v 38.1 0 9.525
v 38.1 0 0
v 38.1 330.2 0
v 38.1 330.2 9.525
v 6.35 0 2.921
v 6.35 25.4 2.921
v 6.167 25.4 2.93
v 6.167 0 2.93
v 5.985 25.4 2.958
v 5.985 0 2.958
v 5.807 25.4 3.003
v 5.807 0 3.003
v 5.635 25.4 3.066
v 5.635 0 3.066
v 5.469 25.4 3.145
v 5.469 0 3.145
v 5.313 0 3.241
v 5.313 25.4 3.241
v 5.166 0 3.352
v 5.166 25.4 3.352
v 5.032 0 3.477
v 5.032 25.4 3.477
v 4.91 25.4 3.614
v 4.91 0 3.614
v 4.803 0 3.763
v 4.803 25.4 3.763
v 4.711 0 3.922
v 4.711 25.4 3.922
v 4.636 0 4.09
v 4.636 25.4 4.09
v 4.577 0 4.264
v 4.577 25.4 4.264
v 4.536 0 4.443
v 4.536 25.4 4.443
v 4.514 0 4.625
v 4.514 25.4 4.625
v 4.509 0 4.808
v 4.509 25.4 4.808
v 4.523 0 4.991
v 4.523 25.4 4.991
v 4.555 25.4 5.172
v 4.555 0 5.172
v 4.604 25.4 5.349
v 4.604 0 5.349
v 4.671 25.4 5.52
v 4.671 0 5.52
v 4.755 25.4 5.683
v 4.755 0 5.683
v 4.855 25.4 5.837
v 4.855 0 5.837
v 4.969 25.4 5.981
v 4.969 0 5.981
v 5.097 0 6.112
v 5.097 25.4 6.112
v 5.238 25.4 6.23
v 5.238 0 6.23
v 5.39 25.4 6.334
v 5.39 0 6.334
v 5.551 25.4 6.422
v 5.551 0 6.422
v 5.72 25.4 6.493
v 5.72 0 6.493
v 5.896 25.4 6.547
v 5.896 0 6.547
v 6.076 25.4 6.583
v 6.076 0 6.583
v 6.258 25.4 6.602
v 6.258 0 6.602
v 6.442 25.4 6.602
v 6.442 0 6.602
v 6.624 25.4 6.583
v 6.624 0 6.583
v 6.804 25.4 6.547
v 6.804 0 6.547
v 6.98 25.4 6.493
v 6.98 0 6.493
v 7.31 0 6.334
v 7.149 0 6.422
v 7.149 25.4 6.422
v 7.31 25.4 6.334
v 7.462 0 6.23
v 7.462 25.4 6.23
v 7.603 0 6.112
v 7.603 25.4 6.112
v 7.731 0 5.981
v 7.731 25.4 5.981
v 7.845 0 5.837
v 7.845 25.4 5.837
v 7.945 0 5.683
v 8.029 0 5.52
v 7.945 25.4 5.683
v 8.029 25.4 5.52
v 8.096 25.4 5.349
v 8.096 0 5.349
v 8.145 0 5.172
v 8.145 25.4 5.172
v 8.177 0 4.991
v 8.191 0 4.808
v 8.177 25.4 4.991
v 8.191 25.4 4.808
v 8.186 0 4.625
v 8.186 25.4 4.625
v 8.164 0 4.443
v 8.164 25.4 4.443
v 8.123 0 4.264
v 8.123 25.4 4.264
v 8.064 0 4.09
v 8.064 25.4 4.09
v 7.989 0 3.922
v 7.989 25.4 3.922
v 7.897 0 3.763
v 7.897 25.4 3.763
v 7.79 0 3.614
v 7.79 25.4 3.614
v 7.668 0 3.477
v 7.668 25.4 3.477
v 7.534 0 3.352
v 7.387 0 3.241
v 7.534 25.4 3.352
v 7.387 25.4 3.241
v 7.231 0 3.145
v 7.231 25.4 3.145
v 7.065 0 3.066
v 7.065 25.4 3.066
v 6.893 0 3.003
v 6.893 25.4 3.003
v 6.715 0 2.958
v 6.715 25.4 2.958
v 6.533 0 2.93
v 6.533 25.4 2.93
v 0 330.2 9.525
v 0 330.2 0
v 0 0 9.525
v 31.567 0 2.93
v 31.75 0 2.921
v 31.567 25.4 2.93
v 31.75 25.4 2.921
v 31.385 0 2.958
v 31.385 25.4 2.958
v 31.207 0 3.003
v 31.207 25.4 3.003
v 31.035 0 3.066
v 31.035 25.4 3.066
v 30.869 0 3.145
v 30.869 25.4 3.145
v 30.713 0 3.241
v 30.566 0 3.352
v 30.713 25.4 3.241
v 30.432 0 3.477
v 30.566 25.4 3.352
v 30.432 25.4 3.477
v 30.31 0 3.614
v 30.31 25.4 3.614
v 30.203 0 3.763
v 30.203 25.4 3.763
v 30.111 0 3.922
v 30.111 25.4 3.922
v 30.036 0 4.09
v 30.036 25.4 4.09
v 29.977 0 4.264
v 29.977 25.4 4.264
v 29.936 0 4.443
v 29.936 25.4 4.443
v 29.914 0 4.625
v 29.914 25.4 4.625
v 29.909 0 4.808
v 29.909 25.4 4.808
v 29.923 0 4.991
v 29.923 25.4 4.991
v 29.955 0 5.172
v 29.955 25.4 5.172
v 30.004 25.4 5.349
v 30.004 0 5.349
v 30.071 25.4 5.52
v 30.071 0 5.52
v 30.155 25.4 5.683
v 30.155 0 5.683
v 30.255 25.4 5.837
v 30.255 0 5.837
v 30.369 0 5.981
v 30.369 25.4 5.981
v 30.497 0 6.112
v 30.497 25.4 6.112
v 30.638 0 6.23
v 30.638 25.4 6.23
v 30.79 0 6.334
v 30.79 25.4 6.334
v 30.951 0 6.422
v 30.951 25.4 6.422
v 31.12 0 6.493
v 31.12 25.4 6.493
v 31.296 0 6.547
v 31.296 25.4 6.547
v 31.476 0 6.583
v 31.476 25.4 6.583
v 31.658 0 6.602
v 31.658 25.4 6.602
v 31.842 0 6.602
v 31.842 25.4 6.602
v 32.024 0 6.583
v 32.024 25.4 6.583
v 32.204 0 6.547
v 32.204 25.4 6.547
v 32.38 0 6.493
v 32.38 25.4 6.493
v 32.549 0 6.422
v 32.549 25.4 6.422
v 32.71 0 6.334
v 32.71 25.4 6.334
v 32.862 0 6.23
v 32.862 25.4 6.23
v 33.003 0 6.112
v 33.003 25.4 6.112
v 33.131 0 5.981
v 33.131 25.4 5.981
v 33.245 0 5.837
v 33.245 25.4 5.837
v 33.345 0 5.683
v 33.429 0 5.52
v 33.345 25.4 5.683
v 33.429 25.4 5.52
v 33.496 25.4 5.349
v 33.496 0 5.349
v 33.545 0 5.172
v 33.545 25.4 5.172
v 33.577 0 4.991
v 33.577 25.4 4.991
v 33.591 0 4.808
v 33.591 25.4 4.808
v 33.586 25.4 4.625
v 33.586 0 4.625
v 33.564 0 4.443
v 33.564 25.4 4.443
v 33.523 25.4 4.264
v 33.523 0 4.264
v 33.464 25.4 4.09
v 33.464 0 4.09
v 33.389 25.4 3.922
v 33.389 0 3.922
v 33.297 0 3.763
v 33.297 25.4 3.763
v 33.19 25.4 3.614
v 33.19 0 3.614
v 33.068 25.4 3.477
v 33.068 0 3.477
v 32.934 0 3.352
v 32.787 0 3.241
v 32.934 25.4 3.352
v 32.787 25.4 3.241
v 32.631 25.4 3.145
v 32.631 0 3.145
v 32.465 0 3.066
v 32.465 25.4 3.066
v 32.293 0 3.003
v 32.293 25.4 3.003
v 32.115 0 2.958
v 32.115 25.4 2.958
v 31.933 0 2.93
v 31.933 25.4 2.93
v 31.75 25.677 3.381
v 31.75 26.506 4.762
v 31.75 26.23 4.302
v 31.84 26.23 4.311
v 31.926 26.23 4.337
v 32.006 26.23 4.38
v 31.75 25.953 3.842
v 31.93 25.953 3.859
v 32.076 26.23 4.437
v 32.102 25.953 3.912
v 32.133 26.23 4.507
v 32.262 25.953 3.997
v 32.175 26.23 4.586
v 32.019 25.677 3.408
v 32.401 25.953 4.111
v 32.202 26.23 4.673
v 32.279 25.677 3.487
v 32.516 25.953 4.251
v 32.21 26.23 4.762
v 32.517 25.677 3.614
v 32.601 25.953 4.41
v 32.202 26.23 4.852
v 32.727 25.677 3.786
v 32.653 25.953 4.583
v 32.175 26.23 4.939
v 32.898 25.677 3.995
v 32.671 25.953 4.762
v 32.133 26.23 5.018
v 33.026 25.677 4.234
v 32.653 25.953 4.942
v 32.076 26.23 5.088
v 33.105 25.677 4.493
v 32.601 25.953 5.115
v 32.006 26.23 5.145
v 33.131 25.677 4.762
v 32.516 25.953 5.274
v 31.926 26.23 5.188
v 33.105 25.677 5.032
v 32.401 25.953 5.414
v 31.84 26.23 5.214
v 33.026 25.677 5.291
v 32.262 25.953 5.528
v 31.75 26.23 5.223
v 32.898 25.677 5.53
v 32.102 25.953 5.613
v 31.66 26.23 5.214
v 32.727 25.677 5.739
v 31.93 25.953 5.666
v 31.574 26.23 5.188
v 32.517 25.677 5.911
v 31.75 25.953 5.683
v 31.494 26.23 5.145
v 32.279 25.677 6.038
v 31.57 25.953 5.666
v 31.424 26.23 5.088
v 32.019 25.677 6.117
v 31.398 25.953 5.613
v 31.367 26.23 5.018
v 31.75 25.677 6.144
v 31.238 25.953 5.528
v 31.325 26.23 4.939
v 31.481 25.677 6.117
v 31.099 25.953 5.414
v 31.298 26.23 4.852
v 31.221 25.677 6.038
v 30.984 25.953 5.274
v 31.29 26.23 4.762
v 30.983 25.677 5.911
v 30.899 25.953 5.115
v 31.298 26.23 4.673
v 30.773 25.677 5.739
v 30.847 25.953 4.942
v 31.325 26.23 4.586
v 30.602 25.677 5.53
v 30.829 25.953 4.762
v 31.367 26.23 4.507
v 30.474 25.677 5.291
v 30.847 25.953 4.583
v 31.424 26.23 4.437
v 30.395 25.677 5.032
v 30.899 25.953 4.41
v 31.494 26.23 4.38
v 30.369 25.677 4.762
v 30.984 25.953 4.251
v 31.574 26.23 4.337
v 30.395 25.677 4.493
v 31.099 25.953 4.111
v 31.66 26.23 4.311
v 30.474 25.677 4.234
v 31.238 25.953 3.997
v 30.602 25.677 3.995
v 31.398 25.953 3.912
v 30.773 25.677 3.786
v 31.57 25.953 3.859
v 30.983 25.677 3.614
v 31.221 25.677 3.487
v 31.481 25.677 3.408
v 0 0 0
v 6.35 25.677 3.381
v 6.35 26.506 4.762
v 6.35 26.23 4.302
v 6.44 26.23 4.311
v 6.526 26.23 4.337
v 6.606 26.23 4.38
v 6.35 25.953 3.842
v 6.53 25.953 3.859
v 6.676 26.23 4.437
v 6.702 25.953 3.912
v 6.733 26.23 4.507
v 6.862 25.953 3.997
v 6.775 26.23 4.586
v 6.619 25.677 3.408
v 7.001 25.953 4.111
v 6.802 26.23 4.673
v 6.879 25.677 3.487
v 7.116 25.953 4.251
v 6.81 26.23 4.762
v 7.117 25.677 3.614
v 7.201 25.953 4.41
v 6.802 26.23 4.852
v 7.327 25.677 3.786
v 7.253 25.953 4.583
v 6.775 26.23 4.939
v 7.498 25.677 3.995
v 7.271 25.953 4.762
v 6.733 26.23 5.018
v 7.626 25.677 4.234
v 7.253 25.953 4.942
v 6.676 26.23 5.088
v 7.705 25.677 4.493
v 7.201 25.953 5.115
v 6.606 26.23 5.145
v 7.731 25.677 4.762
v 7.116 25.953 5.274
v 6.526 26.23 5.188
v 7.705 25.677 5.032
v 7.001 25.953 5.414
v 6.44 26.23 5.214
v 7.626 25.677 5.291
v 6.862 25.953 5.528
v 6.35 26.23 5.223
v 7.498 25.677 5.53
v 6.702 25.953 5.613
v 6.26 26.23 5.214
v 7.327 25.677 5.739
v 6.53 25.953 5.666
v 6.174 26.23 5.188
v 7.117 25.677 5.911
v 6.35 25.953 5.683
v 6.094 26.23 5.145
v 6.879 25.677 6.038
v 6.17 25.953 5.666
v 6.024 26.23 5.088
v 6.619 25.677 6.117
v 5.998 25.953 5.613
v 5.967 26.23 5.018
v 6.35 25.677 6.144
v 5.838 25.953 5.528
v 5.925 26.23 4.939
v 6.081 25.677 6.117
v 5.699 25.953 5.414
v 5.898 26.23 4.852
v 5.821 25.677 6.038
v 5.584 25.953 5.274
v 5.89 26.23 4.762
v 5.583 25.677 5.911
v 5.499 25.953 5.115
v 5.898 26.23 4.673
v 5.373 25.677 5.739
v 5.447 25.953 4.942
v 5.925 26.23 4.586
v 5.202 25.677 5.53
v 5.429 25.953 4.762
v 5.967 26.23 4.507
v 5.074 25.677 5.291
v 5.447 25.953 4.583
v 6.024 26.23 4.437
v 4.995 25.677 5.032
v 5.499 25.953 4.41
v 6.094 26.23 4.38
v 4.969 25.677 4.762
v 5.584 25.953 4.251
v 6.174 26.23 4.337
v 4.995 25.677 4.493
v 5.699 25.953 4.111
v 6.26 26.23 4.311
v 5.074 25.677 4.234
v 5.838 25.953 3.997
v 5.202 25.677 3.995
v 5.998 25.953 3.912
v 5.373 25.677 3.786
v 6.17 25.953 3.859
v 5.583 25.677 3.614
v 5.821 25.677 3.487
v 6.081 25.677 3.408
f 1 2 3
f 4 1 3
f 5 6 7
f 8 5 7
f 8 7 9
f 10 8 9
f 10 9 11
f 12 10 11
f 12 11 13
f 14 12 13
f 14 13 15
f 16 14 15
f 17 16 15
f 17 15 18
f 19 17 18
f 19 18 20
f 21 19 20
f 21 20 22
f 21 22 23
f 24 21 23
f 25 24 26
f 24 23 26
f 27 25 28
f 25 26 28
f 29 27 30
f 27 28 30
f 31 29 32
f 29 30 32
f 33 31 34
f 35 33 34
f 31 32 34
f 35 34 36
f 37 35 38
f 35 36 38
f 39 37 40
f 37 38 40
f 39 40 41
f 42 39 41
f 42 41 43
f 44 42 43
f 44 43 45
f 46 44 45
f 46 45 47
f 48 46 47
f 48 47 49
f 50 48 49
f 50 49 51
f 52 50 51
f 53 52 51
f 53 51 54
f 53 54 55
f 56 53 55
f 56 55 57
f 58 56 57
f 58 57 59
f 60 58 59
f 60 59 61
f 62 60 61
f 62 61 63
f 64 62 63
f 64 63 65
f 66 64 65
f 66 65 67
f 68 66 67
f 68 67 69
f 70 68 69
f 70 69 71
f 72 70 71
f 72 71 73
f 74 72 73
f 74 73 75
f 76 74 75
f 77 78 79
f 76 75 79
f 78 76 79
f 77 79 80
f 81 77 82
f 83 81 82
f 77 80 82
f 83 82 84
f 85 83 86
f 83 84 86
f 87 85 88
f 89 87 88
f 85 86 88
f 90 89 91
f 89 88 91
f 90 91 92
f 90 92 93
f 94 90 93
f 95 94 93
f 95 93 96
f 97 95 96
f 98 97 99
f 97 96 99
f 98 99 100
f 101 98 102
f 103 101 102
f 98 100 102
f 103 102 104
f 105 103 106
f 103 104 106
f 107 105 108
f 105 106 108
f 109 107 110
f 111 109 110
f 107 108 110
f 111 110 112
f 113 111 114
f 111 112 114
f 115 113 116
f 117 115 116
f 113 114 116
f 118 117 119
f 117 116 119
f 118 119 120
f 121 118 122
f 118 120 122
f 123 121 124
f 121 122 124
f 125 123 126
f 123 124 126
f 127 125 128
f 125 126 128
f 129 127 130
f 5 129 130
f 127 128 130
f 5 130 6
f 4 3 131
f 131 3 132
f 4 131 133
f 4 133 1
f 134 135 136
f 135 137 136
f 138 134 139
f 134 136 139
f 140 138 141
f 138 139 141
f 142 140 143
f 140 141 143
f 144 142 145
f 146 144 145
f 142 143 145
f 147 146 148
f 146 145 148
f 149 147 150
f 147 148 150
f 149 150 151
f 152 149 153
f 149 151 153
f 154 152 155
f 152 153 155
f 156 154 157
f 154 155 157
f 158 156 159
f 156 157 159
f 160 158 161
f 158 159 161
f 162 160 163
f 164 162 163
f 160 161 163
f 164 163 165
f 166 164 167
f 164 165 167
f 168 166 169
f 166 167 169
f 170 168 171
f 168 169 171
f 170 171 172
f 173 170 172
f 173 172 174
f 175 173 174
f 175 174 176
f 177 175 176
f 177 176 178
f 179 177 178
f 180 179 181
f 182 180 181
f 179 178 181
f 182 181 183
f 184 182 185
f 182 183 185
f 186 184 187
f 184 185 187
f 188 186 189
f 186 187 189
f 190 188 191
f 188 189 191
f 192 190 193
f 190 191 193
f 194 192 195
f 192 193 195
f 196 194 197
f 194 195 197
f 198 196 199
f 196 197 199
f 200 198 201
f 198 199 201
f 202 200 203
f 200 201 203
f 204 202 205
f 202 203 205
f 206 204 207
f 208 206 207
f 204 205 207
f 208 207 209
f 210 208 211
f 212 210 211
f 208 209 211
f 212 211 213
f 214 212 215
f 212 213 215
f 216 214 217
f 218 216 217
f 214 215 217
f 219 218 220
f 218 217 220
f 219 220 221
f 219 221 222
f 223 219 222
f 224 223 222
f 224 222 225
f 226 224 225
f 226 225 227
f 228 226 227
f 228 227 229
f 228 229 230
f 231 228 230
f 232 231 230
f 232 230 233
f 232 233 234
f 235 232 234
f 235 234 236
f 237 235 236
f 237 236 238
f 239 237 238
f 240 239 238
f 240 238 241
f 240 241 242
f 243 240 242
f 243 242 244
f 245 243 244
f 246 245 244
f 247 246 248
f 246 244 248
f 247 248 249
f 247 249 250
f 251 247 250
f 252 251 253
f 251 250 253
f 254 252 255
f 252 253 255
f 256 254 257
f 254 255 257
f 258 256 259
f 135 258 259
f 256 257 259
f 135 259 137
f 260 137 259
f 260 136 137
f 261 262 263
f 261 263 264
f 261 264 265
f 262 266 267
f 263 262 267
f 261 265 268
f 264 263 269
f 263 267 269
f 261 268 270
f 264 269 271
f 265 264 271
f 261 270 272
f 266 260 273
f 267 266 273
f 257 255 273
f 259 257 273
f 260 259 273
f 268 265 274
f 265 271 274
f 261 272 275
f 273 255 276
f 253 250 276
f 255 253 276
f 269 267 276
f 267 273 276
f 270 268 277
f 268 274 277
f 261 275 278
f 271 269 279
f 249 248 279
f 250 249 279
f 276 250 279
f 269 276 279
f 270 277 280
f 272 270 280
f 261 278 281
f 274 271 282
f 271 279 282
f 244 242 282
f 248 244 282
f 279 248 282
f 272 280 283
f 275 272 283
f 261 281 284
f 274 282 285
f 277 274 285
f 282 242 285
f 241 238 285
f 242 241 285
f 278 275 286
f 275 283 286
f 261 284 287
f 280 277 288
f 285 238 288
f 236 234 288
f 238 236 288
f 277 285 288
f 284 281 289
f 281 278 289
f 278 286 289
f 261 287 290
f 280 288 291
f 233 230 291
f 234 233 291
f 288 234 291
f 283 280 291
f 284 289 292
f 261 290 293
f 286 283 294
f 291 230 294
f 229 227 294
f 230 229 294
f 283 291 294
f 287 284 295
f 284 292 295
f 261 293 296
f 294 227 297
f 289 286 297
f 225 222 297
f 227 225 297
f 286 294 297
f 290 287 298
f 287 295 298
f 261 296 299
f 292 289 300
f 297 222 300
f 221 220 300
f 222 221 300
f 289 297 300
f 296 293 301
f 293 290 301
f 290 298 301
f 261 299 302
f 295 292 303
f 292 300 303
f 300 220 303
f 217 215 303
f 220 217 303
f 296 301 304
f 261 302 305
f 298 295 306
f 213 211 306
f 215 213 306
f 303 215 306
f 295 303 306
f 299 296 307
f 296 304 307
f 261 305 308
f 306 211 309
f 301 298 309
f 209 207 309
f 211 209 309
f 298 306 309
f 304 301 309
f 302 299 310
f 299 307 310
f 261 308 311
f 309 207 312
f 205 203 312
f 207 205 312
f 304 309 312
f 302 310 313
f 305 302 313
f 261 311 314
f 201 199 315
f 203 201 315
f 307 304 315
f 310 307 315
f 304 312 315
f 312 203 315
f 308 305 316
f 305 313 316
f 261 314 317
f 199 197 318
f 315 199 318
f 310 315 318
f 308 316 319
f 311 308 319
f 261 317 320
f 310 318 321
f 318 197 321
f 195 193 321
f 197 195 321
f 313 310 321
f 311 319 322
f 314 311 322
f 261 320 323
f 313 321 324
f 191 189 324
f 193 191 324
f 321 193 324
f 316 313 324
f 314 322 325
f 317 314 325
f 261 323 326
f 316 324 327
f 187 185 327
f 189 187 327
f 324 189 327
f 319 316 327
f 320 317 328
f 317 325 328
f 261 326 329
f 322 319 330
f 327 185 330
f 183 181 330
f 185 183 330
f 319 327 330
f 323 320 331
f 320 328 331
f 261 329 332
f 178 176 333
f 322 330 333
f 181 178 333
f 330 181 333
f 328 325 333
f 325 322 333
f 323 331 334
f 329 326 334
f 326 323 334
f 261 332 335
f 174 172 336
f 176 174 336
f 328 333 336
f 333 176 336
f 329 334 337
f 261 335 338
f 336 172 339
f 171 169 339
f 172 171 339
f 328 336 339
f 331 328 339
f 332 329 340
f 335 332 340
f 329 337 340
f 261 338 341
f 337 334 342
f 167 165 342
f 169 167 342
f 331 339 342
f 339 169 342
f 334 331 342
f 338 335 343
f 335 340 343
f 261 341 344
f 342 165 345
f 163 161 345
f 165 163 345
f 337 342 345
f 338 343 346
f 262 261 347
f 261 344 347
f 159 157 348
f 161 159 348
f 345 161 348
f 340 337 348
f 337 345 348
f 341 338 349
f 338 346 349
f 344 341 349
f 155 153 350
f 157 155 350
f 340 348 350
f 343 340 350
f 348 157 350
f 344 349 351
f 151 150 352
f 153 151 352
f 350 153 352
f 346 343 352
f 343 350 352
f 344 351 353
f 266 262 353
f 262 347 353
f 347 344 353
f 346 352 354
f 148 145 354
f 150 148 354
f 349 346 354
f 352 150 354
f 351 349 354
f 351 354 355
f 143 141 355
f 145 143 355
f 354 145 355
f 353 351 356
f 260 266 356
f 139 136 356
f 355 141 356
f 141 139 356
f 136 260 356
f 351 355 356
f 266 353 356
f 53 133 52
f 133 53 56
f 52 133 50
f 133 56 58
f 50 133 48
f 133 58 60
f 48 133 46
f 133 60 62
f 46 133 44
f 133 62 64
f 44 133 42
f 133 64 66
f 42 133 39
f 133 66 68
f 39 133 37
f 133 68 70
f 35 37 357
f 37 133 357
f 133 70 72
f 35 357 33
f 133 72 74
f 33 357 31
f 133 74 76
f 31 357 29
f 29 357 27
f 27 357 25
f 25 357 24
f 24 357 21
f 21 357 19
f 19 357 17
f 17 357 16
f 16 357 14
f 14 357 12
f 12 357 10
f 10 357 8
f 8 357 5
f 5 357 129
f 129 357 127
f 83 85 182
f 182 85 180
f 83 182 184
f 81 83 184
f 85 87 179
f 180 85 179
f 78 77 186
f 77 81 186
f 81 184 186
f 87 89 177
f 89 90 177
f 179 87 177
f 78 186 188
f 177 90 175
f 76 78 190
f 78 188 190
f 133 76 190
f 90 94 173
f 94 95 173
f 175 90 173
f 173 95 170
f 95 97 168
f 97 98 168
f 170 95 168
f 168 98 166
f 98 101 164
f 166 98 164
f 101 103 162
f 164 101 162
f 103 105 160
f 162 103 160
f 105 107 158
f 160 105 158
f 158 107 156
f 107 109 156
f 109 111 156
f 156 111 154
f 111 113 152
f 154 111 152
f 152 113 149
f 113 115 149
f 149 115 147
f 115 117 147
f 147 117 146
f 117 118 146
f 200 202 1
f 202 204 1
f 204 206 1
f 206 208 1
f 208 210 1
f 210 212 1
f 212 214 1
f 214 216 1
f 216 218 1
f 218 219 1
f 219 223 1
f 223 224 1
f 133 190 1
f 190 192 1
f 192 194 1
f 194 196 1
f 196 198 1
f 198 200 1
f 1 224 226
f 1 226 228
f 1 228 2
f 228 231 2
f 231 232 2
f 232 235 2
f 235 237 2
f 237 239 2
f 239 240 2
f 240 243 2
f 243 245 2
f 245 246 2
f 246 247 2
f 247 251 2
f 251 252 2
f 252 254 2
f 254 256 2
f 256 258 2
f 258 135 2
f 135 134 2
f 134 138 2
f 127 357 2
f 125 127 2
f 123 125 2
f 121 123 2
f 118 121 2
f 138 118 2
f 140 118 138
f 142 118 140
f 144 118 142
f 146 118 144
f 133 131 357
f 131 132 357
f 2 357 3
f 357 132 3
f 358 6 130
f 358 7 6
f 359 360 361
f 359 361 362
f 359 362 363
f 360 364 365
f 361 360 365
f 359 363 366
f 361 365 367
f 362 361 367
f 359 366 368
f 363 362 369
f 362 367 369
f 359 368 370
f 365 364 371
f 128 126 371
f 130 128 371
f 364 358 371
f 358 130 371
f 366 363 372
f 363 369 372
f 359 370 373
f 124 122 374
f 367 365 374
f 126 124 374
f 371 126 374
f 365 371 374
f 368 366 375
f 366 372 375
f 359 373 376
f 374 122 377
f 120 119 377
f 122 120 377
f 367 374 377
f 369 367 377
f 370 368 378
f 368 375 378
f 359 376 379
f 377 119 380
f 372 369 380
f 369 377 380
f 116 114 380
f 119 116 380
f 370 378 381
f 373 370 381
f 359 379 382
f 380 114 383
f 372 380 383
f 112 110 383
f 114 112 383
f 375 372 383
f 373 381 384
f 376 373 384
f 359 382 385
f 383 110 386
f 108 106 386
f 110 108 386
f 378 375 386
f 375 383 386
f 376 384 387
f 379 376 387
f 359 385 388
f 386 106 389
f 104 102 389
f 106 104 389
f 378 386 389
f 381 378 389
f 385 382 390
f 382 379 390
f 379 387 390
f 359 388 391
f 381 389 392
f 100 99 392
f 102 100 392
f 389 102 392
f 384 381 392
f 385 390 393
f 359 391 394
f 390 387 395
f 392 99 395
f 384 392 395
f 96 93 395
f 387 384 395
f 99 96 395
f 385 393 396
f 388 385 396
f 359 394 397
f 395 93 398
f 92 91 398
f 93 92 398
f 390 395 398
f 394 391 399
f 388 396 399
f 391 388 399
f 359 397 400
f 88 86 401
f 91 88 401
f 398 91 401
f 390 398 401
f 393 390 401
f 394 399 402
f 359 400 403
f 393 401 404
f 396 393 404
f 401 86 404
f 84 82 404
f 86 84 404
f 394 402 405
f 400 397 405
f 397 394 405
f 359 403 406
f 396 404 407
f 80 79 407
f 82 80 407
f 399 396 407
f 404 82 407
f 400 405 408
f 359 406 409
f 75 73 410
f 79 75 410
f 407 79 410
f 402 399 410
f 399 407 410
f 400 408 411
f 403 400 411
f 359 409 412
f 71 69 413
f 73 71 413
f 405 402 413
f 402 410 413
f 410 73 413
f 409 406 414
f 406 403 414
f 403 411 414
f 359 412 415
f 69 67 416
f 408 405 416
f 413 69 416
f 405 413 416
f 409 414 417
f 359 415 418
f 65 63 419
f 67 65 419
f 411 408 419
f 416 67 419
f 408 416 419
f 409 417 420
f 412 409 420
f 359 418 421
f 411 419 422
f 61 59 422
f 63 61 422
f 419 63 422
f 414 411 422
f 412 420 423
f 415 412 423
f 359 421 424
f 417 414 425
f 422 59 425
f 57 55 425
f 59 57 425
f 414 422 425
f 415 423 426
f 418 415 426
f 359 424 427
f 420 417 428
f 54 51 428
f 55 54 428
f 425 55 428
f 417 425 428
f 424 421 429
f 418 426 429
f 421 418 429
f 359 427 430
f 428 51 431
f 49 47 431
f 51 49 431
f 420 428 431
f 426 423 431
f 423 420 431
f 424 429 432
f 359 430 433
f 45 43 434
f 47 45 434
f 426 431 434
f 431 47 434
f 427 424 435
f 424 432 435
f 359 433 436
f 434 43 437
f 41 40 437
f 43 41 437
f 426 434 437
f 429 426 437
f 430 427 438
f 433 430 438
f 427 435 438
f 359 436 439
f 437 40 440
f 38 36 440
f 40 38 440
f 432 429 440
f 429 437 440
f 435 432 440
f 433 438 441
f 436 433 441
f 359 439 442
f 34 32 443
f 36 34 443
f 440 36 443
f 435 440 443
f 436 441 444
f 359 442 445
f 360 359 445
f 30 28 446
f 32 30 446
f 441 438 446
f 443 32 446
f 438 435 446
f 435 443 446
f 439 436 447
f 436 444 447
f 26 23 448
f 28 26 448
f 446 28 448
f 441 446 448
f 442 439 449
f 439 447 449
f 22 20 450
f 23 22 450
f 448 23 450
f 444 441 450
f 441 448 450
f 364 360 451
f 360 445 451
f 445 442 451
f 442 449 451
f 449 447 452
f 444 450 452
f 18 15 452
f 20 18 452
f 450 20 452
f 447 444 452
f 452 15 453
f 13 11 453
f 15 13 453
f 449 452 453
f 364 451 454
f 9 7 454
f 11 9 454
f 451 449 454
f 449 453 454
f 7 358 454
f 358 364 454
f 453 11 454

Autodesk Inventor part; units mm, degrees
ref_plane "YZ Plane" through (0, 0, 0) normal (1, 0, 0) x (0, 1, 0)
ref_plane "XZ Plane" through (0, 0, 0) normal (0, 1, 0) x (-1, 0, 0)
ref_plane "XY Plane" through (0, 0, 0) normal (0, 0, 1) x (1, 0, 0)
sketch "Sketch1" plane through (0, 0, 0) normal (0, 0, 1) x (1, 0, 0)
  line L0 (0, 0) -> (38.1, 0)
  line L1 (38.1, 0) -> (38.1, 330.2)
  line L2 (38.1, 330.2) -> (0, 330.2)
  line L3 (0, 330.2) -> (0, 0)
  dimension "d0" = 38.1
  dimension "d1" = 330.2
extrude "Extrusion1" add sketch "Sketch1" along normal blind 9.525
sketch "Sketch2" plane through (0, 0, 0) normal (0, -1, 0) x (1, 0, 0)
  line L0 (0, 0) -> (38.1, 0) projected
  line L1 (38.1, 0) -> (38.1, 9.525) projected
  line L2 (0, 9.525) -> (38.1, 9.525) projected
  line L3 (0, 0) -> (0, 9.525) projected
  point P0 (31.75, 4.7625)
  point P1 (6.35, 4.7625)
  dimension "d4" = 25.4
  dimension "d5" = 38.1
  dimension "d6" = 9.525
  dimension "d7" = 6.35
  dimension "d8" = 4.7625
  dimension "d9" = 4.7625
hole "Hole1" at (31.75, 0, 4.7625) at (6.35, 0, 4.7625) direction (0, 1, 0) diameter 3.683 depth 25.4 tip angle 118 thread size "10-24 UNC" class "2B" standard "ANSI Unified Screw Threads"
equation "\"d8\" = 0.5 * d6"
equation "\"d9\" = d8"
properties part number "CollectionPost"
